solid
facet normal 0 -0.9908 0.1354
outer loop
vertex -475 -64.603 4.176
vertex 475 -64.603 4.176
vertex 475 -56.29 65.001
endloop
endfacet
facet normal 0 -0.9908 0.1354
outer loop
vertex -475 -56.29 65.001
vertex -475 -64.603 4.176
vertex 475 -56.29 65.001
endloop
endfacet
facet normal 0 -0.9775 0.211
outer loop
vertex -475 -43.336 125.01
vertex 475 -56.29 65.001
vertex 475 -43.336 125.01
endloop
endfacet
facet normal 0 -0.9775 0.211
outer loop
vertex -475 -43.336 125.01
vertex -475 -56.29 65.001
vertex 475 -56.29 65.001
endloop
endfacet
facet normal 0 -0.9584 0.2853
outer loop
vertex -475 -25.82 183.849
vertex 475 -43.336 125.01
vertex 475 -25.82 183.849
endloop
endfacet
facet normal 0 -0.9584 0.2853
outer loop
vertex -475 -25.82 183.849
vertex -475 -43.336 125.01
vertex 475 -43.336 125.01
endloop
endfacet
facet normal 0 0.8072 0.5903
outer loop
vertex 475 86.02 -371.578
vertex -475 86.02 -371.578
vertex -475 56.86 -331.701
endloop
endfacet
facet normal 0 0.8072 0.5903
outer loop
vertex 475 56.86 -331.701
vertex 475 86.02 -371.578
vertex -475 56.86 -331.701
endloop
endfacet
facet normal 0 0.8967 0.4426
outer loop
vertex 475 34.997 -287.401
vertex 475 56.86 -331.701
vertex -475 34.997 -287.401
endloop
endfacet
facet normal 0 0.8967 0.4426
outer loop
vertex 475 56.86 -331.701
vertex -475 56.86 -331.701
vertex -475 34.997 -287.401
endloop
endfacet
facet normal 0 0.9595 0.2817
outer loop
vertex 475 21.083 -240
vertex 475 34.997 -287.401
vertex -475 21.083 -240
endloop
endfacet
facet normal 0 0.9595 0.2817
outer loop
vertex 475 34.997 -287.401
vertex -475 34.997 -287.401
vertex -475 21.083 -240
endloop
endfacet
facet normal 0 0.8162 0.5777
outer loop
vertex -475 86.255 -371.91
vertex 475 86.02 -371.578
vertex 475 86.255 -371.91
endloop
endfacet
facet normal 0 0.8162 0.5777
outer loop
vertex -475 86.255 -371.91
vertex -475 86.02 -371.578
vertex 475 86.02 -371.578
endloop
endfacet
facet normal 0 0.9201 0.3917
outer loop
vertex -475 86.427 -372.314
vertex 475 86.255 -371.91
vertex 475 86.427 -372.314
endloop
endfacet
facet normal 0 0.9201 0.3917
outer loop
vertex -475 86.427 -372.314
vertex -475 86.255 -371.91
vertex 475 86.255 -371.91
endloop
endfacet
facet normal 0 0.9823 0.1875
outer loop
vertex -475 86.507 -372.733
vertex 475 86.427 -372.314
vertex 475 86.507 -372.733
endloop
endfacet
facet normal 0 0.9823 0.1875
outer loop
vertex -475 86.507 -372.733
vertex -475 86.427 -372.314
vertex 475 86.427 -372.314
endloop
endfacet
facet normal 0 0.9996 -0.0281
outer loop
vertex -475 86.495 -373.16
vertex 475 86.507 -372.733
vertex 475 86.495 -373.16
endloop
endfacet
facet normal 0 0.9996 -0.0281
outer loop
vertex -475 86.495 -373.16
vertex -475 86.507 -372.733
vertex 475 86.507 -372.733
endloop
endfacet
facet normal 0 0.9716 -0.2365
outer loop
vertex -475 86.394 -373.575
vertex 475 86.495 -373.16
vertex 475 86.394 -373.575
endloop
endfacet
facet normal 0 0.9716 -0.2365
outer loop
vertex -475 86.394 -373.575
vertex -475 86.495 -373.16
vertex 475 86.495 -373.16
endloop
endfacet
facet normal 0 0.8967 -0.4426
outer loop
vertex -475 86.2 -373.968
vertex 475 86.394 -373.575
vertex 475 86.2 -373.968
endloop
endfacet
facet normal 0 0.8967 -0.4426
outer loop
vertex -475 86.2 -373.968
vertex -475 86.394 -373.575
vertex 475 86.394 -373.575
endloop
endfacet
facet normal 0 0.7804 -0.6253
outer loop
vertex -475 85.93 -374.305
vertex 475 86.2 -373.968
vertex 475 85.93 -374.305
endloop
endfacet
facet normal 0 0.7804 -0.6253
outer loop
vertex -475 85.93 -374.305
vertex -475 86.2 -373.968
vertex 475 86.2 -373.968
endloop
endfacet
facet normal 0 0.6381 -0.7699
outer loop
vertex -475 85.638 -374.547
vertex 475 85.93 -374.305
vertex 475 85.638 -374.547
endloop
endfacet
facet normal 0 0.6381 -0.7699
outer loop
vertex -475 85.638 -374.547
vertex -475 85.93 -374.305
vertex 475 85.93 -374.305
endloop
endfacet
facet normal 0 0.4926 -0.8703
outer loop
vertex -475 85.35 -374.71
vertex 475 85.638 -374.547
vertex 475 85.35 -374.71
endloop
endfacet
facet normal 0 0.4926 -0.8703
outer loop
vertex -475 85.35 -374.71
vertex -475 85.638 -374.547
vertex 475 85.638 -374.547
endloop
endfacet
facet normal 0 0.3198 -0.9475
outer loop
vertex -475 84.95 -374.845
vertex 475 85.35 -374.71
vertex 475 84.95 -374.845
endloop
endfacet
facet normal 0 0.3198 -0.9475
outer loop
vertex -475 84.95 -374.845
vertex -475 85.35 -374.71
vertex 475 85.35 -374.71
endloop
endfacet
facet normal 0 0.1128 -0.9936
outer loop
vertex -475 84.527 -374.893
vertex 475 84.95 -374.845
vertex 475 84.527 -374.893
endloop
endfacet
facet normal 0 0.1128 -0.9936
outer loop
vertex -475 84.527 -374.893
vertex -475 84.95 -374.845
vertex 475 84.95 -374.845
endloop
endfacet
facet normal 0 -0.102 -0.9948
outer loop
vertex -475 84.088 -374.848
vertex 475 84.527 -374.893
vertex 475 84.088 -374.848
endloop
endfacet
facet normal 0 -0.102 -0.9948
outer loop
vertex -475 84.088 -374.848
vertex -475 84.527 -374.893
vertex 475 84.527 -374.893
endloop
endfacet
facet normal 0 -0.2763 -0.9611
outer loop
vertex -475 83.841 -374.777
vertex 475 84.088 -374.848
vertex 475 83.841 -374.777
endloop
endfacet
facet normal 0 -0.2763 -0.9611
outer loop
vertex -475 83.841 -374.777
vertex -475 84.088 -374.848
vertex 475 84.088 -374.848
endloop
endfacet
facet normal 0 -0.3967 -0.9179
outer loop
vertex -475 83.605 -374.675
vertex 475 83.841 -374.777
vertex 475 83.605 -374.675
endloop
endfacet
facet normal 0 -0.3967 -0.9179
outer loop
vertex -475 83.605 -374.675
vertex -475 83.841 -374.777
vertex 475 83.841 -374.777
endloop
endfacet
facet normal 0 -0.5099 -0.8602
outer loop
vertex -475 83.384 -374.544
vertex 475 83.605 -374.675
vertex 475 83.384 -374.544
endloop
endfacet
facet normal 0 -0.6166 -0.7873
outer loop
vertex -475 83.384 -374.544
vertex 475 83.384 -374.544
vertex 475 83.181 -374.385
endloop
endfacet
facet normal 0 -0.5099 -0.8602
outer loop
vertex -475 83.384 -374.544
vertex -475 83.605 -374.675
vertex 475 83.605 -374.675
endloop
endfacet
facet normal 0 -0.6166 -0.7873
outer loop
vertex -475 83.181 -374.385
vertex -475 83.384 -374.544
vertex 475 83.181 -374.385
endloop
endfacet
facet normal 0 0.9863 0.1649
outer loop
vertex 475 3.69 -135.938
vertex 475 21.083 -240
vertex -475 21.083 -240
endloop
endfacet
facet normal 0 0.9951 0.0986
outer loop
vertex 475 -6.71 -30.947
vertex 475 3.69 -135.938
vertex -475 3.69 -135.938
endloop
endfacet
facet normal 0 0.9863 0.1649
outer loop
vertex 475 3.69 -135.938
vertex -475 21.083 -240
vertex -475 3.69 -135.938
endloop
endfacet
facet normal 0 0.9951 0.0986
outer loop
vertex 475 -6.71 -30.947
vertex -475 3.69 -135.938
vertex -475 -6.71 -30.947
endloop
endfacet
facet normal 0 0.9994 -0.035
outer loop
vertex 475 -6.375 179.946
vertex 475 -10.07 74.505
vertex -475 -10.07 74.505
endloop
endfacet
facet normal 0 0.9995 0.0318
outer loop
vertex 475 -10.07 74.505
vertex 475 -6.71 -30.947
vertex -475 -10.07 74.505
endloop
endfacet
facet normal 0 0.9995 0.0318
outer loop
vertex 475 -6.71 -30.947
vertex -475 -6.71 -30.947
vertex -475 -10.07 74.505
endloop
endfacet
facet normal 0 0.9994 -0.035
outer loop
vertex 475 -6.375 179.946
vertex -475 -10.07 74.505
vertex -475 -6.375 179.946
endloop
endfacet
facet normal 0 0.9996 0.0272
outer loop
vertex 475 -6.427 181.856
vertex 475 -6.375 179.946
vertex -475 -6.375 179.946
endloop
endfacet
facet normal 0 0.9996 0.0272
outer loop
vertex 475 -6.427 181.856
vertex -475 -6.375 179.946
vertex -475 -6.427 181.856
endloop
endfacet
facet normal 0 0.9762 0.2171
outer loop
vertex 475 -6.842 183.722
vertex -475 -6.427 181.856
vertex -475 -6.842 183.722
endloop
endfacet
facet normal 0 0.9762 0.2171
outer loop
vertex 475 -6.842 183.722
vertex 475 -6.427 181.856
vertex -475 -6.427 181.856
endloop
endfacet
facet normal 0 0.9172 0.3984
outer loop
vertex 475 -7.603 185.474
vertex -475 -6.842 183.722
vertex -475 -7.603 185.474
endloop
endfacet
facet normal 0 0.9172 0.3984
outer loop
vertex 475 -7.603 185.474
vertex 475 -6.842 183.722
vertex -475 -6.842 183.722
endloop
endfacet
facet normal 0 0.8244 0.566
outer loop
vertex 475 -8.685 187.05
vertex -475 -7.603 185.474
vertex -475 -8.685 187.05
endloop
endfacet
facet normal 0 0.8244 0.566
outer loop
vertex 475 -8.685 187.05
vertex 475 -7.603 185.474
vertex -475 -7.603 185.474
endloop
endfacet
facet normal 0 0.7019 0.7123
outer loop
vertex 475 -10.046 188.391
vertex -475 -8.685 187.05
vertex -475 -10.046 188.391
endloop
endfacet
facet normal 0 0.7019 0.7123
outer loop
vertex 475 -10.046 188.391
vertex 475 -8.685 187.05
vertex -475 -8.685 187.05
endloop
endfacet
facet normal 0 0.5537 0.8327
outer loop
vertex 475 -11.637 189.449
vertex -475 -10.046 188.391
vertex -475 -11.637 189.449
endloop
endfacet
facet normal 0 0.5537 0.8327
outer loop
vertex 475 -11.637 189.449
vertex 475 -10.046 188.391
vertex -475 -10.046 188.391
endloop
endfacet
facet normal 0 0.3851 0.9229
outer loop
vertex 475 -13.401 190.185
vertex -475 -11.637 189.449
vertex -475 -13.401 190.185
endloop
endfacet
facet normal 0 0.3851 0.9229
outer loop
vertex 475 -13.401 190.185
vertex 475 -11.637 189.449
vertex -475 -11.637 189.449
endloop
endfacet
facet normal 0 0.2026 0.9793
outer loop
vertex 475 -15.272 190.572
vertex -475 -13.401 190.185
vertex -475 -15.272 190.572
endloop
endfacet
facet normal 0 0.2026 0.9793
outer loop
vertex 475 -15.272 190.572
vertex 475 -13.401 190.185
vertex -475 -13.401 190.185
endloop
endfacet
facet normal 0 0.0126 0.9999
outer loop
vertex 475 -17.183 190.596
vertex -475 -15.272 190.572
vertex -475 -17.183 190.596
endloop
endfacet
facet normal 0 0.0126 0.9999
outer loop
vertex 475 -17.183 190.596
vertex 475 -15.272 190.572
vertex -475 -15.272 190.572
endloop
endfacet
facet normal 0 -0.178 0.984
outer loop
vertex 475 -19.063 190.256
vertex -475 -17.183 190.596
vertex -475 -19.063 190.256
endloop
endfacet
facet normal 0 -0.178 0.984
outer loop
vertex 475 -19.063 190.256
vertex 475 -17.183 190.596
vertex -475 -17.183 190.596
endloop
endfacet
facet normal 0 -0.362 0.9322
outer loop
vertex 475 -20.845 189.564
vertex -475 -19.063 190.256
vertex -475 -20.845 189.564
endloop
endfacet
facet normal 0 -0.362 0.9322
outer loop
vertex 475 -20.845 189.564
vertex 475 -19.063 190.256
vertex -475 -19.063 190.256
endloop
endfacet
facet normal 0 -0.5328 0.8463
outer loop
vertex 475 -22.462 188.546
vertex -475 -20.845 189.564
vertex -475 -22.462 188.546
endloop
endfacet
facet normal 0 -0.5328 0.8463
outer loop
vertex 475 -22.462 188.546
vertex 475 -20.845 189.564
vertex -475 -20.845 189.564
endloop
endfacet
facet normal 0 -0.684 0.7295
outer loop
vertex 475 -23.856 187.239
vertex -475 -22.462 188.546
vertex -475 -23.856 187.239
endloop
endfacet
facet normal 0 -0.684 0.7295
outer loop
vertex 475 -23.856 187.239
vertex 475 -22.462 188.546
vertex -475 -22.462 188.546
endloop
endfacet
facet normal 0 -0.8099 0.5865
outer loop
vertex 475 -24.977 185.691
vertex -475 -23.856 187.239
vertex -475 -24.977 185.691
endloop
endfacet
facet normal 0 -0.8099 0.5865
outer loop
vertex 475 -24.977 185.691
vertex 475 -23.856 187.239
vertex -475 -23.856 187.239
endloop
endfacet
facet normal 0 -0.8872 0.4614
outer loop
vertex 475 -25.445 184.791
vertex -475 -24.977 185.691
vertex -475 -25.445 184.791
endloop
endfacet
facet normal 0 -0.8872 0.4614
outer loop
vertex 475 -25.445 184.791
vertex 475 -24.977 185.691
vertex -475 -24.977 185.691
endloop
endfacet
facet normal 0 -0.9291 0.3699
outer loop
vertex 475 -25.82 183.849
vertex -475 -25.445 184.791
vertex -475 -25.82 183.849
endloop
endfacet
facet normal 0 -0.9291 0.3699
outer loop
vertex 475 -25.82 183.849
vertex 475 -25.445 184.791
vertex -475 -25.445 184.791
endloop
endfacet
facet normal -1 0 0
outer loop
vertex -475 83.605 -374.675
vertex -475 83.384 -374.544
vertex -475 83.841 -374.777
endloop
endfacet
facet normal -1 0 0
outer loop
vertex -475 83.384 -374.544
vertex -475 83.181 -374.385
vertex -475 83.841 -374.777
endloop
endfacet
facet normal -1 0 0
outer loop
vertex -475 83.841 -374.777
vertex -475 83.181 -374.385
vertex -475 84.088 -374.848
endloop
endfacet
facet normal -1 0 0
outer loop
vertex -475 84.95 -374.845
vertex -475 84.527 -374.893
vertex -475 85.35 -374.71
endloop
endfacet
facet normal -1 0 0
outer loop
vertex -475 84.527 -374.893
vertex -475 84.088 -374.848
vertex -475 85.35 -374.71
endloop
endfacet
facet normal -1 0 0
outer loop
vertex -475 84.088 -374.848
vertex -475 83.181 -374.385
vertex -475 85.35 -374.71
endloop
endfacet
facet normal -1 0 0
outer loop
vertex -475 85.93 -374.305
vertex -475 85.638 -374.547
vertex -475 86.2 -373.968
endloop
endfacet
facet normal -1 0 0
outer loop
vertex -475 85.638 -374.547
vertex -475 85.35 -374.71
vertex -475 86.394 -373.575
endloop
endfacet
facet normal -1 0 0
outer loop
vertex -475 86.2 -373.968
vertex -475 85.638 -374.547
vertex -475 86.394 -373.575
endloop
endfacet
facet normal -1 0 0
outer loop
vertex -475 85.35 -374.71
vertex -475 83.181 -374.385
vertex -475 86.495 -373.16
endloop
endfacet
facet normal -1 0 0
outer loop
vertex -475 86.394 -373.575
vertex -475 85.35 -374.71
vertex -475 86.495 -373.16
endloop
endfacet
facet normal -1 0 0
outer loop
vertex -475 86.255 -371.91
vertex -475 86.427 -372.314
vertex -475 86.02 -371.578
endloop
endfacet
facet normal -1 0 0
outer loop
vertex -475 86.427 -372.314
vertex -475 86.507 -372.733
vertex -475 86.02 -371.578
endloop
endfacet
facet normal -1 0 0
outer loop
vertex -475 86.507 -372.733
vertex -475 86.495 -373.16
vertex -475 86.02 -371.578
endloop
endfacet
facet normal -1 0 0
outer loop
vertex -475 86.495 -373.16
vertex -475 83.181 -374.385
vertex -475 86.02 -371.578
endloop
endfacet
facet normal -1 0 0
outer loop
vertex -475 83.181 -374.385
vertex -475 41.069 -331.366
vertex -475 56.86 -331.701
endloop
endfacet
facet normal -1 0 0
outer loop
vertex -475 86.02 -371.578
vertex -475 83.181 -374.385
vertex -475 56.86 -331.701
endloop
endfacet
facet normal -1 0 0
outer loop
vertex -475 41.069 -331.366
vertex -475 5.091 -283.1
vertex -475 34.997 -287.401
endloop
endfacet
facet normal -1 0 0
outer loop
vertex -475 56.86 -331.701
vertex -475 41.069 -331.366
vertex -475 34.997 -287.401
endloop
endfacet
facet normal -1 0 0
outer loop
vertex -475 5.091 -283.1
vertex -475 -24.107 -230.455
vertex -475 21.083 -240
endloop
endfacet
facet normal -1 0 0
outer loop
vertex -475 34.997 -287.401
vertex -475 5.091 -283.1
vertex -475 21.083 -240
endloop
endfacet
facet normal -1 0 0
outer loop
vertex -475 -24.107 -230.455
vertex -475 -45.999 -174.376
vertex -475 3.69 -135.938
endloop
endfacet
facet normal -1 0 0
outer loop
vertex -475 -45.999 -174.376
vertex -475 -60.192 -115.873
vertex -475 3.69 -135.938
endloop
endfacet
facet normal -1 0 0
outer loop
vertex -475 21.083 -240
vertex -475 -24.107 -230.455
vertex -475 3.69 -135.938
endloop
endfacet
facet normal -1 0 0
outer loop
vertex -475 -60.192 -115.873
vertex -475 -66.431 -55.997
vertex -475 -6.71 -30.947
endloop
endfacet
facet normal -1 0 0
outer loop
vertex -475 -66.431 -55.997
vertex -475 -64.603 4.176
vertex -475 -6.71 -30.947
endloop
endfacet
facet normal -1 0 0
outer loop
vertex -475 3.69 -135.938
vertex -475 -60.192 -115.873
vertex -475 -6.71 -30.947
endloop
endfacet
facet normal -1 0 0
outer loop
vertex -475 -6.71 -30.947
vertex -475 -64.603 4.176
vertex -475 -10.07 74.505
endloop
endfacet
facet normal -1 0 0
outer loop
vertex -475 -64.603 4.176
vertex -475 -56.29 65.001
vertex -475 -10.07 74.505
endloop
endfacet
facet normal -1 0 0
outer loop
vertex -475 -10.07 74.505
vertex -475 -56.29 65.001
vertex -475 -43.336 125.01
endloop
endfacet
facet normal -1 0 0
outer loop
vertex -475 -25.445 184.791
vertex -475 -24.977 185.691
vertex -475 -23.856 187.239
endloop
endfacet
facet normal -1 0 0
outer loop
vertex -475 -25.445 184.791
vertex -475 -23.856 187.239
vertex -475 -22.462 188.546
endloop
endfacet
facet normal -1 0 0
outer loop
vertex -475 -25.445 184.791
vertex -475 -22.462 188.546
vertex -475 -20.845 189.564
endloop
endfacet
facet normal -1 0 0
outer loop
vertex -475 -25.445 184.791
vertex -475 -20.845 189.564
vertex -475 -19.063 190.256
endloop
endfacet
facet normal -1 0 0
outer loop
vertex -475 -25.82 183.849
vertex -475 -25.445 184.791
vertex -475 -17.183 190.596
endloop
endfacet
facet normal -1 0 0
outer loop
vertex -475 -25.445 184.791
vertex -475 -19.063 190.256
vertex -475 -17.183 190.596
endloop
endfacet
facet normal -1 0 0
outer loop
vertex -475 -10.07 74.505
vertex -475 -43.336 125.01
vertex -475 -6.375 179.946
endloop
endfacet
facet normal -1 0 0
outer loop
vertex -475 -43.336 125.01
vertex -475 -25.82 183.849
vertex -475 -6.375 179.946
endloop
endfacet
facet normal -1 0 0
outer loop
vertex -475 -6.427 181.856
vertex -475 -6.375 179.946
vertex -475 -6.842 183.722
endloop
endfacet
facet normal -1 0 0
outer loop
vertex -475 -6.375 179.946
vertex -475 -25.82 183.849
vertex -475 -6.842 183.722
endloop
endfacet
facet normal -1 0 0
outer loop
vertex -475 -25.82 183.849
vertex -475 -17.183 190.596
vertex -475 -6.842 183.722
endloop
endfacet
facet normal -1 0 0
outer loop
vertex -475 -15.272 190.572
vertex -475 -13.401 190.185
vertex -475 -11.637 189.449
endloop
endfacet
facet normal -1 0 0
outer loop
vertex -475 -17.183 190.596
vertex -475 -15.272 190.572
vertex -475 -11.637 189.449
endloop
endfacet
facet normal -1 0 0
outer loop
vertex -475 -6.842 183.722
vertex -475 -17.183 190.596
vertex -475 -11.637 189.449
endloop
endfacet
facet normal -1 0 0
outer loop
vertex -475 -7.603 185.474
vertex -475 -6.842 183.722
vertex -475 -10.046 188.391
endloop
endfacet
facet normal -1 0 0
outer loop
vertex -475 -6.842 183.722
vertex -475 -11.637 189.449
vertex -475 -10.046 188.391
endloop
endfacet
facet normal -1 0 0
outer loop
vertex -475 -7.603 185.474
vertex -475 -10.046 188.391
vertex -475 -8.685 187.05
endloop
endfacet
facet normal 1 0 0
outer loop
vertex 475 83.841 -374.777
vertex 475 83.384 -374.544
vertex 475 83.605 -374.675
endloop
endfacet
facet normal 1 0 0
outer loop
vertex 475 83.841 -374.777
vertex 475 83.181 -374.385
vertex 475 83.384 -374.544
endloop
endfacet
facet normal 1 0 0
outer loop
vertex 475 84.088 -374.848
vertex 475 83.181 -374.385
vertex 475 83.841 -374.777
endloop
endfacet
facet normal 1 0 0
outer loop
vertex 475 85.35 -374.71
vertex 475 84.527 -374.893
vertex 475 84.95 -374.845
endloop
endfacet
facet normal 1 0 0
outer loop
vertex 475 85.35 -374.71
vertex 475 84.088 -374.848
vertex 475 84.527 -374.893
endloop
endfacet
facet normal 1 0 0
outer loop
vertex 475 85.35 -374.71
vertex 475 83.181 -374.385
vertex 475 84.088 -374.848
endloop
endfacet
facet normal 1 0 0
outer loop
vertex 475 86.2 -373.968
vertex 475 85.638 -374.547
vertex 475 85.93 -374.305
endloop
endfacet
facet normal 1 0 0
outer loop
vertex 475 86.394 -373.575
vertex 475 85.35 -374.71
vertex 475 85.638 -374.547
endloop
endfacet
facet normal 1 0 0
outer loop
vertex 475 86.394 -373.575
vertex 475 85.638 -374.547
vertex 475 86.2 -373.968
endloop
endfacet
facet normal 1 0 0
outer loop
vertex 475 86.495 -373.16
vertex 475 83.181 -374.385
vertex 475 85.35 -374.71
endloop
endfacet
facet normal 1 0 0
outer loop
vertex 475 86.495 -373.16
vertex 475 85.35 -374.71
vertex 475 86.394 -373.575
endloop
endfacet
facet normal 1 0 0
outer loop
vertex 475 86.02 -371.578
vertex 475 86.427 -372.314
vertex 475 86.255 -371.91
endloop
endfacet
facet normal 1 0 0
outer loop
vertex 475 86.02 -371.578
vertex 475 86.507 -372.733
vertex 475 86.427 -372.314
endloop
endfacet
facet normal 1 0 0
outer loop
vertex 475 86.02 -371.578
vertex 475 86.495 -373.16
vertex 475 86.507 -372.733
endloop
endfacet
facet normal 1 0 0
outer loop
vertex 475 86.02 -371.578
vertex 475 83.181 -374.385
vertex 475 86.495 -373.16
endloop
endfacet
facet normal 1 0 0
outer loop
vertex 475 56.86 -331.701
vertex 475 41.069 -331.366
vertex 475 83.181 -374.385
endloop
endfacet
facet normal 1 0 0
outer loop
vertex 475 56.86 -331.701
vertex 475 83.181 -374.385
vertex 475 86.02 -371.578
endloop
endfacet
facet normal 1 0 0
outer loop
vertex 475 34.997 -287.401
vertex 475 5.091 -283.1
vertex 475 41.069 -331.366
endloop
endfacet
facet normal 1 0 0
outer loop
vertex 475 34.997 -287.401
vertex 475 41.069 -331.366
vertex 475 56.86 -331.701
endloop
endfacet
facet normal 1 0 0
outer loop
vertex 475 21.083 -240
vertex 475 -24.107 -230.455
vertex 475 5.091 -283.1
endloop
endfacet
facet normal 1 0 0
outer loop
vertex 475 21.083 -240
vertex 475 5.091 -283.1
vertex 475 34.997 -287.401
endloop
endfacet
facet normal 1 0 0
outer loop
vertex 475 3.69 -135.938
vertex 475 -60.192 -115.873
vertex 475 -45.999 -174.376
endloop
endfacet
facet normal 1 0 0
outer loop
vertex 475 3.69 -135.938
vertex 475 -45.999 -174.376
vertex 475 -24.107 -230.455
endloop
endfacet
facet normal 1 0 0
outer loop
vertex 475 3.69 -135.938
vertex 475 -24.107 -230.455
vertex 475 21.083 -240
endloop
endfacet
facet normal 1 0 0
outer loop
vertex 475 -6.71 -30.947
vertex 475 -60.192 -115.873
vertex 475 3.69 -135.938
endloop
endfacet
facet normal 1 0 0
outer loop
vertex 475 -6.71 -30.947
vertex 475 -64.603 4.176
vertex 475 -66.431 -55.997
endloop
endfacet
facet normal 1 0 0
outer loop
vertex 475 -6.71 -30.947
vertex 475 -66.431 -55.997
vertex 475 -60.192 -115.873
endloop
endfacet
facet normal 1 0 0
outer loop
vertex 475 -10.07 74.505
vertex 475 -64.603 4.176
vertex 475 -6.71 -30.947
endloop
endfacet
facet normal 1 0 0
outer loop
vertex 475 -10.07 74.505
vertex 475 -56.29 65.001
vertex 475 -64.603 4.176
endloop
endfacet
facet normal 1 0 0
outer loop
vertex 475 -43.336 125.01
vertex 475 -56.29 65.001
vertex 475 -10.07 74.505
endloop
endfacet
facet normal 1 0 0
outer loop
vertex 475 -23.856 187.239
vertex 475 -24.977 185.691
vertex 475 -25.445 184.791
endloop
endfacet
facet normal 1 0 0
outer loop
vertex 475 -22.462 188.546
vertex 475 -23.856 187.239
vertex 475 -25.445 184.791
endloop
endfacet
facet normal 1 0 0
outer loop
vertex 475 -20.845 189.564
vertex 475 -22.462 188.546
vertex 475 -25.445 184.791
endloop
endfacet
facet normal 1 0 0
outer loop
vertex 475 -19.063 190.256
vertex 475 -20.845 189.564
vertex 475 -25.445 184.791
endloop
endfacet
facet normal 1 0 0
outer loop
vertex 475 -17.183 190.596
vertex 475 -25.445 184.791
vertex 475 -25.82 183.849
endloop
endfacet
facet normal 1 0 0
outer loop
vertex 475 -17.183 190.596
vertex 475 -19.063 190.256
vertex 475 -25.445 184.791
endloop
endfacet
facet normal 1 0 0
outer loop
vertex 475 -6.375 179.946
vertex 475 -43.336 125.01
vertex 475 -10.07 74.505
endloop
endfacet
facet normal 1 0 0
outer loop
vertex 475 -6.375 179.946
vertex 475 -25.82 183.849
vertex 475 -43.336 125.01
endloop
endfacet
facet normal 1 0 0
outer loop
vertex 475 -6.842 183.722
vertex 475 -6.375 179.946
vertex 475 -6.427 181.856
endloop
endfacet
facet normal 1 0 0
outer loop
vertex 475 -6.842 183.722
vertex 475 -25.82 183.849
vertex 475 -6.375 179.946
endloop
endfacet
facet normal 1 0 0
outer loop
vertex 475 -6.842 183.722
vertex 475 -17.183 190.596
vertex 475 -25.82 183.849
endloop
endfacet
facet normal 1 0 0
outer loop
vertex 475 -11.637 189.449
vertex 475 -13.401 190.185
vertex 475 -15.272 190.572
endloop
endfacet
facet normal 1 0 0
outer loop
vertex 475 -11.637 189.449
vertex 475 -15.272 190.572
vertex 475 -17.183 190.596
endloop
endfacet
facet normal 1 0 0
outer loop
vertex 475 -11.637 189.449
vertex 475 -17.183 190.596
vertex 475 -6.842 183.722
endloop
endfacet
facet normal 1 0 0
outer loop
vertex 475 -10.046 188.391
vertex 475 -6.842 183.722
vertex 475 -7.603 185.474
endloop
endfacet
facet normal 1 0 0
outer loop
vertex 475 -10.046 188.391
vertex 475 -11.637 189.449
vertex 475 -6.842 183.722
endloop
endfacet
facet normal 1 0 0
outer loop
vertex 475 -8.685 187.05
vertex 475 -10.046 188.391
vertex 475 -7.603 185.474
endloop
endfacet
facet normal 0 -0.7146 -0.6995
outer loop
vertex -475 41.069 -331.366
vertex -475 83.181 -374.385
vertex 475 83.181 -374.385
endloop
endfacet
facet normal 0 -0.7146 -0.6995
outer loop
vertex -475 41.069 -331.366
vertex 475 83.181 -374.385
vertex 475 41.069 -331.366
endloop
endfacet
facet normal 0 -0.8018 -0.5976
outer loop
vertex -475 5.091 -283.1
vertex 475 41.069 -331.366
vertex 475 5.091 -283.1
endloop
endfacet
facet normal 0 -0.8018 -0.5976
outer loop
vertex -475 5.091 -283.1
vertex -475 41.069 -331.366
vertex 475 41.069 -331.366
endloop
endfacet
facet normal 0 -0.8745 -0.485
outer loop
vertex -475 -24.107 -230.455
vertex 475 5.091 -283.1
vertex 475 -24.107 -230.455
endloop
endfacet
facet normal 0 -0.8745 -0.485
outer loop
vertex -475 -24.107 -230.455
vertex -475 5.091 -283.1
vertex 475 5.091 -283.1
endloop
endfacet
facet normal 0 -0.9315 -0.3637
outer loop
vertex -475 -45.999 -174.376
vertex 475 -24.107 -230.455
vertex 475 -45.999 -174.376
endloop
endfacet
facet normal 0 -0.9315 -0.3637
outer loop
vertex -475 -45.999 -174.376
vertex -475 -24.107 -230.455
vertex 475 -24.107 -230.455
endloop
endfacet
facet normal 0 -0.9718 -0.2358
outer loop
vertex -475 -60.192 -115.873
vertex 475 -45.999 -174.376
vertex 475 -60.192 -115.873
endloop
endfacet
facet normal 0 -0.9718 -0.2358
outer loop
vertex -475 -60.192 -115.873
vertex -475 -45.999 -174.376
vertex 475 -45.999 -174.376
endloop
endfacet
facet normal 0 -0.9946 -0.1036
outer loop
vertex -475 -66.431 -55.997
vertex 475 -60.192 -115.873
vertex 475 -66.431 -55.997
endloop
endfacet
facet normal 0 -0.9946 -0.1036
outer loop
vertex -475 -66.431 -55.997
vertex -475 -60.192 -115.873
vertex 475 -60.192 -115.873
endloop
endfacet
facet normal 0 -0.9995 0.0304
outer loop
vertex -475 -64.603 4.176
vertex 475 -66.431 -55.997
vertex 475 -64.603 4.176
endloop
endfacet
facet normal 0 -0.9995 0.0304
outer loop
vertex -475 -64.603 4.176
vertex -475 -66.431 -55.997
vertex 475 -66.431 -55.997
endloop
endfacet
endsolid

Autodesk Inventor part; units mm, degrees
ref_plane "YZ Plane" through (0, 0, 0) normal (1, 0, 0) x (0, 1, 0)
ref_plane "XZ Plane" through (0, 0, 0) normal (0, 1, 0) x (-1, 0, 0)
ref_plane "XY Plane" through (0, 0, 0) normal (0, 0, 1) x (1, 0, 0)
sketch "スケッチ1" plane through (0, 0, 0) normal (1, 0, 0) x (0, 1, 0)
  line L0 (0, 250) -> (114.6125, -400)
  line L1 (0, 387.8164) -> (0, -558.8236) projected
  arc A0 (0, 250) -> (21.0831, -240) centre (1567.8058, 72.0039) ccw
  arc A1 (21.0831, -240) -> (114.6125, -400) centre (301.453, -183.444) ccw
  arc A2 (0, 250) -> (-64.6034, 4.1758) centre (731.6003, -73.6681) ccw
  arc A3 (-64.6034, 4.1758) -> (114.6125, -400) centre (382.2372, -39.5113) ccw
  point P0 (0, 0)
  dimension "d0" = 10
  dimension "d1" = 650
  dimension "d4" = 250
  dimension "d10" = 1577.8776
  dimension "d11" = 286.0172
  dimension "d12" = 160
  dimension "d13" = 800
extrude "押し出し2" add sketch "スケッチ1" along normal mid plane 950 contours A0 L1 A3 A2 | A3 L1 A0 A1
fillet "フィレット3" radius 10 1 edges at (0, 0, 250)
fillet "フィレット3" radius 2 1 edges at (0, 114.6125, -400)
properties part number "cover_re" material "ポリスチレン"
